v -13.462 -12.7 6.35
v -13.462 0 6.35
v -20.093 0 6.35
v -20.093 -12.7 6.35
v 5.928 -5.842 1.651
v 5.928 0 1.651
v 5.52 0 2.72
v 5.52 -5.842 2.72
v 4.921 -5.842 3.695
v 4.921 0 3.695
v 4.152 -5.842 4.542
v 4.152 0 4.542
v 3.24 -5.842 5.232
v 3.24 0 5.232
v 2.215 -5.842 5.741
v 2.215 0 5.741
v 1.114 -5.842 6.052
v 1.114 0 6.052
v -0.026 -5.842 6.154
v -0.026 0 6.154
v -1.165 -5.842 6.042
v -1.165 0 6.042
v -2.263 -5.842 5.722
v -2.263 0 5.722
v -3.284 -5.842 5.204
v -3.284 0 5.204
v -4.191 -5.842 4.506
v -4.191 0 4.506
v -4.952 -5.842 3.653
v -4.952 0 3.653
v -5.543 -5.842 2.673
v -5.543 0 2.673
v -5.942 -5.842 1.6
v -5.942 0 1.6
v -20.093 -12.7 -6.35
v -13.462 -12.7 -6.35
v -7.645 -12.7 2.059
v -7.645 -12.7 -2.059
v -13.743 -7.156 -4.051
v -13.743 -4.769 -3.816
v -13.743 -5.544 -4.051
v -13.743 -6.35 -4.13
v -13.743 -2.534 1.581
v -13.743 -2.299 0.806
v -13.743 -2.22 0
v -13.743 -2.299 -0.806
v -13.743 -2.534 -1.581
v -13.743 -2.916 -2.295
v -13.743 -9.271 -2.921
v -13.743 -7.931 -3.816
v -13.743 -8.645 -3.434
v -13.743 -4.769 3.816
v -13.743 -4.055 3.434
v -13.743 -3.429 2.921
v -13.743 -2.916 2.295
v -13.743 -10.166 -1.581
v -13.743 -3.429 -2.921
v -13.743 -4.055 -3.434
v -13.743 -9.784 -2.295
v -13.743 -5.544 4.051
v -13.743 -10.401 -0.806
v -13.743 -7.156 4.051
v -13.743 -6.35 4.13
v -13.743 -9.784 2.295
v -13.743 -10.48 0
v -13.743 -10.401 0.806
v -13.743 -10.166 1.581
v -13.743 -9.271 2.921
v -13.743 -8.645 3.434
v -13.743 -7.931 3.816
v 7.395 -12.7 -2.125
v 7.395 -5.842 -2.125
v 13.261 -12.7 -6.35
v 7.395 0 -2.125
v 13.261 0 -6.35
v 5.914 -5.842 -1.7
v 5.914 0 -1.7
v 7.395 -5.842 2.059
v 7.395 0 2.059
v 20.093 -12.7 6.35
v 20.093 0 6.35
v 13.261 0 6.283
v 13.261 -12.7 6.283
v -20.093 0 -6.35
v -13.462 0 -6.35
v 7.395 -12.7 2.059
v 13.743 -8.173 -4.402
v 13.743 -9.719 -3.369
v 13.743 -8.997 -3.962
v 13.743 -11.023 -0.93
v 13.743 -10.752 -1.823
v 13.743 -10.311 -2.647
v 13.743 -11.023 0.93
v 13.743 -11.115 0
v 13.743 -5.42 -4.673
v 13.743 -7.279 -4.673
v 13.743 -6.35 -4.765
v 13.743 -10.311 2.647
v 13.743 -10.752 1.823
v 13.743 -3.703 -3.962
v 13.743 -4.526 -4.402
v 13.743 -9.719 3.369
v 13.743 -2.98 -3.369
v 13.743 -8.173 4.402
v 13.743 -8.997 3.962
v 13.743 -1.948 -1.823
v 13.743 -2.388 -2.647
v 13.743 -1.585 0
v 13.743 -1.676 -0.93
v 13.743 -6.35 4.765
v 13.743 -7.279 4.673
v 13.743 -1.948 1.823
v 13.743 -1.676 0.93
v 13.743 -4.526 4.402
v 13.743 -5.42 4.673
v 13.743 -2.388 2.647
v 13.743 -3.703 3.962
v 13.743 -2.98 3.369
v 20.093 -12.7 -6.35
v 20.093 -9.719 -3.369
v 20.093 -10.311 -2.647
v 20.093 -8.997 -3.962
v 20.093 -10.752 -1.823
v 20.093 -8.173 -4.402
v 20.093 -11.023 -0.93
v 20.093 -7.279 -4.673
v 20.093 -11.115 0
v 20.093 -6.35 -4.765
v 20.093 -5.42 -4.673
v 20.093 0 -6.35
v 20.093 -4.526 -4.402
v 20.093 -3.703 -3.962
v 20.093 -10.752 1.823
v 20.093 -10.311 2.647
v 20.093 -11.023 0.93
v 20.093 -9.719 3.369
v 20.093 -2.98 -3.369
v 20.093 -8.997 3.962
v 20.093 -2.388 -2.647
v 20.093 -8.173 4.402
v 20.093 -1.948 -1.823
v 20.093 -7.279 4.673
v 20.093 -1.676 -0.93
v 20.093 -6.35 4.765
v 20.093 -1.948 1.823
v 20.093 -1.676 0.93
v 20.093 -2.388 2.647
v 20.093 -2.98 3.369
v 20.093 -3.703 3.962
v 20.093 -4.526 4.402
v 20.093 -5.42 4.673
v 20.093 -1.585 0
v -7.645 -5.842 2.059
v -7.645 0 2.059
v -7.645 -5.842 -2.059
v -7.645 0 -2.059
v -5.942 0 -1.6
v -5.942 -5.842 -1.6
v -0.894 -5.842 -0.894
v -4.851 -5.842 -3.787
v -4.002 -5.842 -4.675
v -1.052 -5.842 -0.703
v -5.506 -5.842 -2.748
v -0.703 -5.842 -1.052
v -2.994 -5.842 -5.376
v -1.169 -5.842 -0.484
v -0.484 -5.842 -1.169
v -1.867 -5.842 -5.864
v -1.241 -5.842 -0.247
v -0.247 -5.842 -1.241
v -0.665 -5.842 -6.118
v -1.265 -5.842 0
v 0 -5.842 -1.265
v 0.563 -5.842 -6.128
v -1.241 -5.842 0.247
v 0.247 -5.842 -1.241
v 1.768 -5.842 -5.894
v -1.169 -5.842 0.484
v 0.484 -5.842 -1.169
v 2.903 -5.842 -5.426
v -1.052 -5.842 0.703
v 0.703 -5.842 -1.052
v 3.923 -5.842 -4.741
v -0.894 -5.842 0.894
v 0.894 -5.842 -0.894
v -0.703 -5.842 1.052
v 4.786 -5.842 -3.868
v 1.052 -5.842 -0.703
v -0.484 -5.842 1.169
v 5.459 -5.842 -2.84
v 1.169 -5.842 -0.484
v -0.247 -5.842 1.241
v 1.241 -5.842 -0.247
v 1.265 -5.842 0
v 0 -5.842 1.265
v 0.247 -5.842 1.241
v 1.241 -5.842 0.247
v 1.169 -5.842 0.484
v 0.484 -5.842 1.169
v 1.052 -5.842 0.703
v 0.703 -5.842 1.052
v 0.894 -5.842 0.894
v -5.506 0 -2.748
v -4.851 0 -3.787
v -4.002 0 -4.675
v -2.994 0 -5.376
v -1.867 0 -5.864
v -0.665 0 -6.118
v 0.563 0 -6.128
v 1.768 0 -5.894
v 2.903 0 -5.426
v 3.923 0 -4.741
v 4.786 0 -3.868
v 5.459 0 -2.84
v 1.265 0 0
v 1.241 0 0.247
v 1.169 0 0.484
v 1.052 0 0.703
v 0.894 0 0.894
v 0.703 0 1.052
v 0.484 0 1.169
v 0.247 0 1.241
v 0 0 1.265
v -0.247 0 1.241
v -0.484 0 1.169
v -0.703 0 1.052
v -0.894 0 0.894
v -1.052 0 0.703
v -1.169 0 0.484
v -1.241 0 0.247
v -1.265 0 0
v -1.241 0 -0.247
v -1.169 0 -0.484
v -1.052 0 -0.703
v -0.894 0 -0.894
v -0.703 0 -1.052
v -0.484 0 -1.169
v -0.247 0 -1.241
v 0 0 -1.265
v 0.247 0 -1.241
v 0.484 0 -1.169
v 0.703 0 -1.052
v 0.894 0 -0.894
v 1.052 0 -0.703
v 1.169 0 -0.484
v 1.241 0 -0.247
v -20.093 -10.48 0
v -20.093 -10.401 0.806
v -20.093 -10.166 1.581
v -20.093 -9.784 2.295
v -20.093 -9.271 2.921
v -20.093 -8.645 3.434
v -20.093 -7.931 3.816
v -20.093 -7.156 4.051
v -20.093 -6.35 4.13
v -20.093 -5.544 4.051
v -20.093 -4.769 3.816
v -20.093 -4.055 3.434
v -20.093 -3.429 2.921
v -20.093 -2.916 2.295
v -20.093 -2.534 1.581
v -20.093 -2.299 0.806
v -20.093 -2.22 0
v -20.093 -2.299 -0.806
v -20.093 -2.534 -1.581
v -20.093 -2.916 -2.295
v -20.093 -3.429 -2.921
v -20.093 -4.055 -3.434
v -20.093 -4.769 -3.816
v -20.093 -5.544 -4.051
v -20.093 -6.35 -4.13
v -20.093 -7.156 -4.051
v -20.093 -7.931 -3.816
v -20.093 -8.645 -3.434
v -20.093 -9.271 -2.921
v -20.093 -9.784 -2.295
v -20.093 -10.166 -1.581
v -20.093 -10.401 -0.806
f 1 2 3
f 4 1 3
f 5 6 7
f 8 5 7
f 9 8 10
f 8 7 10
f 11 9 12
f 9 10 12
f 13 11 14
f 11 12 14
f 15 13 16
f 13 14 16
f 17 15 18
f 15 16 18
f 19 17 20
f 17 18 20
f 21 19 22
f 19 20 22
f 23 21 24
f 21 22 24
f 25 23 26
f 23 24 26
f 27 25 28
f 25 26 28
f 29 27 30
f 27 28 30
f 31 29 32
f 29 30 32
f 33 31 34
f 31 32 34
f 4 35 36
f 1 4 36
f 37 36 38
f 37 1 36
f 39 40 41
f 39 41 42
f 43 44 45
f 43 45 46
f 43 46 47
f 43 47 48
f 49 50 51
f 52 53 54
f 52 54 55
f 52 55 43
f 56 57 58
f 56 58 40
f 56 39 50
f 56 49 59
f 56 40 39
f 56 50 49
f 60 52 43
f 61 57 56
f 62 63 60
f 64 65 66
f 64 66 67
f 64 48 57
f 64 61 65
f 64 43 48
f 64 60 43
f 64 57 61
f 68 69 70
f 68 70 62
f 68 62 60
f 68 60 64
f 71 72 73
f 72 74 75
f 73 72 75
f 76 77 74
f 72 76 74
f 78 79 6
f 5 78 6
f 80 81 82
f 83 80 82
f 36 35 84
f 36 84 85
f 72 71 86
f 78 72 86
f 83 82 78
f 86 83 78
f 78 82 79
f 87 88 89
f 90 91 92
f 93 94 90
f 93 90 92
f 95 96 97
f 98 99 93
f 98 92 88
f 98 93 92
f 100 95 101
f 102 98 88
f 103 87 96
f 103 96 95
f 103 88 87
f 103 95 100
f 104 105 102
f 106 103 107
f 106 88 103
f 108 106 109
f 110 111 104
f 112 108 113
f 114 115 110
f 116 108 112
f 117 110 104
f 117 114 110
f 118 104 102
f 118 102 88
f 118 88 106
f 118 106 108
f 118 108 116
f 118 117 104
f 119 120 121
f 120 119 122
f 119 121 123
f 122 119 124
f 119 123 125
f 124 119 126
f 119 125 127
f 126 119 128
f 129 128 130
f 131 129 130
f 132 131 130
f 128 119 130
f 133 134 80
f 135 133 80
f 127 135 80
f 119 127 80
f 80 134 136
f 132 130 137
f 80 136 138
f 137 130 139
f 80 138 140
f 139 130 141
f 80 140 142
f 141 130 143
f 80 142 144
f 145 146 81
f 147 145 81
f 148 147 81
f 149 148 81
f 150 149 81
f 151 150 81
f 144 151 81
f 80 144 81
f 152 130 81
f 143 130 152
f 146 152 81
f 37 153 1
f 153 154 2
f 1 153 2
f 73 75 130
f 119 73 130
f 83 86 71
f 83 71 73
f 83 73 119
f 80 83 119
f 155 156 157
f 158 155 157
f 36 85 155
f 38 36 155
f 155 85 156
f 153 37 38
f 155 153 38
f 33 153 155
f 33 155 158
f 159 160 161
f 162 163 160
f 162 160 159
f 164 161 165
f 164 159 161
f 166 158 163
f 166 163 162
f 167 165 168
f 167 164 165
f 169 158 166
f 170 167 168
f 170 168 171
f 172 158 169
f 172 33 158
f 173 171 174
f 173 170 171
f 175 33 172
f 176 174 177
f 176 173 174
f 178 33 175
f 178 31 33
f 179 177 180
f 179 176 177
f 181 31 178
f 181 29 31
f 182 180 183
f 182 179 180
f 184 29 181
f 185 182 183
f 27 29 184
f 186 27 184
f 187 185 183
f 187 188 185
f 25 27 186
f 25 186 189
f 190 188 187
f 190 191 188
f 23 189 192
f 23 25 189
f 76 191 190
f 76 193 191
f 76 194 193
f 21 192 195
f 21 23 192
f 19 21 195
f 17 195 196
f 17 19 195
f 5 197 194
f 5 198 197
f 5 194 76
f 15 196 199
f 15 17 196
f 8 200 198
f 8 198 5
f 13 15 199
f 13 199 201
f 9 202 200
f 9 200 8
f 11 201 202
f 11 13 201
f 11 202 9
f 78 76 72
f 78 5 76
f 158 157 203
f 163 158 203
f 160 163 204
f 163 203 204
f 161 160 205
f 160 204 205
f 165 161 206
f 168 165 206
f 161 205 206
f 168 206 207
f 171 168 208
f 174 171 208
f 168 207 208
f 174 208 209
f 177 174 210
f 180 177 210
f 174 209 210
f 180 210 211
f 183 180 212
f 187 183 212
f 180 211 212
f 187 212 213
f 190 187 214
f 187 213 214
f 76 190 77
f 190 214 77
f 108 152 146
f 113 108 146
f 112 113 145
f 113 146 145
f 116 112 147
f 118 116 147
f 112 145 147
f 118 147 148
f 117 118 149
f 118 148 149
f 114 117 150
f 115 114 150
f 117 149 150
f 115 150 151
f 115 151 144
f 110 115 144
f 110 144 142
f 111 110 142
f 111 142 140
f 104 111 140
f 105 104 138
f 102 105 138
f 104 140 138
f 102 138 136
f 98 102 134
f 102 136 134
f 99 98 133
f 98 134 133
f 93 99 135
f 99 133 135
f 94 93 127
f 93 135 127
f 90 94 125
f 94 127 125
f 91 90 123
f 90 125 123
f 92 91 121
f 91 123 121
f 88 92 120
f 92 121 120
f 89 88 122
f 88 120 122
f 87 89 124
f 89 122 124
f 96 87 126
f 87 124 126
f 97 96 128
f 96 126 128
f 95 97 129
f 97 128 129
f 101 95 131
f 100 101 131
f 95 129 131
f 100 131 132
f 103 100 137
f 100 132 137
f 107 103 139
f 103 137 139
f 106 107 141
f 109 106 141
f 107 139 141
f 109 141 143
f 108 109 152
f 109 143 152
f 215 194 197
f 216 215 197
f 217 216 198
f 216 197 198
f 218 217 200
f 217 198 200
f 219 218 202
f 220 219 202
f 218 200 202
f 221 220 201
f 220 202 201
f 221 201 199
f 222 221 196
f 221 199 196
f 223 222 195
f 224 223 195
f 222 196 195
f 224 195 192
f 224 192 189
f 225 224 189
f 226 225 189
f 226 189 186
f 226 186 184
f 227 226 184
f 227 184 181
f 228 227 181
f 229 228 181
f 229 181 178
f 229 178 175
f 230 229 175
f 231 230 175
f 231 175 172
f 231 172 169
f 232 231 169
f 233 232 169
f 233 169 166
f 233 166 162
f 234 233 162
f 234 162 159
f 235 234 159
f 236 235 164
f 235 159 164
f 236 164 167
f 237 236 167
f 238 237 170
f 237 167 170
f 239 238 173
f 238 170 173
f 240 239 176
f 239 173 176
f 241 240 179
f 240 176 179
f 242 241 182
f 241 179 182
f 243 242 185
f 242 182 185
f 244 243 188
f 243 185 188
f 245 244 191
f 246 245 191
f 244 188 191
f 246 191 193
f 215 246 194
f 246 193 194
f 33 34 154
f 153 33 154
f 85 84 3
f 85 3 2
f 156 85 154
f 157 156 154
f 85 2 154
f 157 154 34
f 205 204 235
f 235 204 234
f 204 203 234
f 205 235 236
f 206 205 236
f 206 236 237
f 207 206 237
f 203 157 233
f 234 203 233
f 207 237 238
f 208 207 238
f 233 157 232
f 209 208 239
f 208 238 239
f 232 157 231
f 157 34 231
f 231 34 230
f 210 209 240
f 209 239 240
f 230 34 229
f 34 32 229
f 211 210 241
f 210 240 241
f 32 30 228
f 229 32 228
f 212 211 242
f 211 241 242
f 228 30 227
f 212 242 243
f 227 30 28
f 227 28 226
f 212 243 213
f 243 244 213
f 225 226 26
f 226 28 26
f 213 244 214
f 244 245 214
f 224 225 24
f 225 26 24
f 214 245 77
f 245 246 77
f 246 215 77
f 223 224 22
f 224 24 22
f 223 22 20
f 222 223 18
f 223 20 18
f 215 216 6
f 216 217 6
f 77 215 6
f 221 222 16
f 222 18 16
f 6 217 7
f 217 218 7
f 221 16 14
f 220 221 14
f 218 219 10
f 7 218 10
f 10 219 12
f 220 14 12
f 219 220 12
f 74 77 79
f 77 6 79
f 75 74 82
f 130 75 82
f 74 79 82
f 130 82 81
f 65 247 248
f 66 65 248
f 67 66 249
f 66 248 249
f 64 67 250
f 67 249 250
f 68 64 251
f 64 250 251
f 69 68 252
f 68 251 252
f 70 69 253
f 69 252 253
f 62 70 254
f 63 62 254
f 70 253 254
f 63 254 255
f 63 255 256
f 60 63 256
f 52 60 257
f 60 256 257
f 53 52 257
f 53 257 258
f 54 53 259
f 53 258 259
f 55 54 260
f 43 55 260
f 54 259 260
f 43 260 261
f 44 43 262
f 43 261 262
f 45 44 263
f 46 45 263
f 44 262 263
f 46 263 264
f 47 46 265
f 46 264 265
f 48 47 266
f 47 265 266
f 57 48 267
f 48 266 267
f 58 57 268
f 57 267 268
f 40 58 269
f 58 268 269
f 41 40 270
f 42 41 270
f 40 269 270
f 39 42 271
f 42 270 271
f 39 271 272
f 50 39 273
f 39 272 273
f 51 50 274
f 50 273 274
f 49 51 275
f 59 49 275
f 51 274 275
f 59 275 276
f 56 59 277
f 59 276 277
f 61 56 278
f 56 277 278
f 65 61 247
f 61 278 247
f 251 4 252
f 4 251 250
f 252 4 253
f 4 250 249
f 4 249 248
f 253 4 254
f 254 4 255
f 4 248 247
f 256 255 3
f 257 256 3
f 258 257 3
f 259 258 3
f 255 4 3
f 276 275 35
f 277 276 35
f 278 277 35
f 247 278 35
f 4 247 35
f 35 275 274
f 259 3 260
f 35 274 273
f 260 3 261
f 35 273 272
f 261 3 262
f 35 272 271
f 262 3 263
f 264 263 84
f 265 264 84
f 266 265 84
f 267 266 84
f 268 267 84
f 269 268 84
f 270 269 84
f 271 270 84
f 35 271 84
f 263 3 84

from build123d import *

# Parameters (mm, degrees)
F1_DEPTH = 12.7
F3_DEPTH = 6.858
F4_R     = 4.130232
F5_DEPTH = 6.35
F6_R     = 4.764812
F7_DEPTH = 6.35
F8_R     = 1.264883
F9_DEPTH = 25.4


with BuildPart() as f1:
    # F0 (on Front) → F1 (new body)
    with BuildSketch(Plane.XZ):
        Polygon((-7.644902, -2.058817), (-7.644902, 2.058817), (-13.462164, 6.35), (-20.092922, 6.35), (-20.092922, 0), (-20.092922, -6.35), (-13.462164, -6.35), align=None)
        with BuildLine():
            Line((7.394814, 2.058817), (5.928265, 1.65051))
            ThreePointArc((5.928265, 1.65051), (-0.026068, 6.153685), (-5.942036, 1.600225))
            Line((-5.942036, 1.600225), (-7.644902, 2.058817))
            Line((-7.644902, 2.058817), (-7.644902, -2.058817))
            Line((-7.644902, -2.058817), (-5.942036, -1.600225))
            ThreePointArc((-5.942036, -1.600225), (-0.051739, -6.153522), (5.914289, -1.699913))
            Line((5.914289, -1.699913), (7.394814, -2.125453))
            Line((7.394814, -2.125453), (7.394814, 2.058817))
        make_face()
        Polygon((13.260647, 6.283364), (7.394814, 2.058817), (7.394814, -2.125453), (13.260647, -6.35), (20.092922, -6.35), (20.092922, 0), (20.092922, 6.35), align=None)
    extrude(amount=F1_DEPTH)

    # F2 (on face) → F3 (cut)
    with BuildSketch(Plane.XZ.offset(12.7)):
        with BuildLine():
            Line((-5.942036, 1.600225), (-7.644902, 2.058817))
            Line((-7.644902, 2.058817), (-7.644902, -2.058817))
            Line((-7.644902, -2.058817), (-5.942036, -1.600225))
            ThreePointArc((-5.942036, -1.600225), (-0.051739, -6.153522), (5.914289, -1.699913))
            Line((5.914289, -1.699913), (7.394814, -2.125453))
            Line((7.394814, -2.125453), (7.394814, 2.058817))
            Line((7.394814, 2.058817), (5.928265, 1.65051))
            ThreePointArc((5.928265, 1.65051), (-0.026068, 6.153685), (-5.942036, 1.600225))
        make_face()
    extrude(amount=-F3_DEPTH, mode=Mode.SUBTRACT)

    # F4 (on face) → F5 (cut)
    with BuildSketch(Plane(origin=(-20.092922, 0, 0), x_dir=(0, -1, 0), z_dir=(-1, 0, 0))):
        with Locations((6.35, 0)):
            Circle(F4_R)
    extrude(amount=-F5_DEPTH, mode=Mode.SUBTRACT)

    # F6 (on face) → F7 (cut)
    with BuildSketch(Plane.YZ.offset(20.092922)):
        with Locations((-6.349694, 0)):
            Circle(F6_R)
    extrude(amount=-F7_DEPTH, mode=Mode.SUBTRACT)

    # F8 (on face) → F9 (cut)
    with BuildSketch(Plane.XZ.offset(5.842)):
        Circle(F8_R)
    extrude(amount=-F9_DEPTH, mode=Mode.SUBTRACT)


solid = f1.part
